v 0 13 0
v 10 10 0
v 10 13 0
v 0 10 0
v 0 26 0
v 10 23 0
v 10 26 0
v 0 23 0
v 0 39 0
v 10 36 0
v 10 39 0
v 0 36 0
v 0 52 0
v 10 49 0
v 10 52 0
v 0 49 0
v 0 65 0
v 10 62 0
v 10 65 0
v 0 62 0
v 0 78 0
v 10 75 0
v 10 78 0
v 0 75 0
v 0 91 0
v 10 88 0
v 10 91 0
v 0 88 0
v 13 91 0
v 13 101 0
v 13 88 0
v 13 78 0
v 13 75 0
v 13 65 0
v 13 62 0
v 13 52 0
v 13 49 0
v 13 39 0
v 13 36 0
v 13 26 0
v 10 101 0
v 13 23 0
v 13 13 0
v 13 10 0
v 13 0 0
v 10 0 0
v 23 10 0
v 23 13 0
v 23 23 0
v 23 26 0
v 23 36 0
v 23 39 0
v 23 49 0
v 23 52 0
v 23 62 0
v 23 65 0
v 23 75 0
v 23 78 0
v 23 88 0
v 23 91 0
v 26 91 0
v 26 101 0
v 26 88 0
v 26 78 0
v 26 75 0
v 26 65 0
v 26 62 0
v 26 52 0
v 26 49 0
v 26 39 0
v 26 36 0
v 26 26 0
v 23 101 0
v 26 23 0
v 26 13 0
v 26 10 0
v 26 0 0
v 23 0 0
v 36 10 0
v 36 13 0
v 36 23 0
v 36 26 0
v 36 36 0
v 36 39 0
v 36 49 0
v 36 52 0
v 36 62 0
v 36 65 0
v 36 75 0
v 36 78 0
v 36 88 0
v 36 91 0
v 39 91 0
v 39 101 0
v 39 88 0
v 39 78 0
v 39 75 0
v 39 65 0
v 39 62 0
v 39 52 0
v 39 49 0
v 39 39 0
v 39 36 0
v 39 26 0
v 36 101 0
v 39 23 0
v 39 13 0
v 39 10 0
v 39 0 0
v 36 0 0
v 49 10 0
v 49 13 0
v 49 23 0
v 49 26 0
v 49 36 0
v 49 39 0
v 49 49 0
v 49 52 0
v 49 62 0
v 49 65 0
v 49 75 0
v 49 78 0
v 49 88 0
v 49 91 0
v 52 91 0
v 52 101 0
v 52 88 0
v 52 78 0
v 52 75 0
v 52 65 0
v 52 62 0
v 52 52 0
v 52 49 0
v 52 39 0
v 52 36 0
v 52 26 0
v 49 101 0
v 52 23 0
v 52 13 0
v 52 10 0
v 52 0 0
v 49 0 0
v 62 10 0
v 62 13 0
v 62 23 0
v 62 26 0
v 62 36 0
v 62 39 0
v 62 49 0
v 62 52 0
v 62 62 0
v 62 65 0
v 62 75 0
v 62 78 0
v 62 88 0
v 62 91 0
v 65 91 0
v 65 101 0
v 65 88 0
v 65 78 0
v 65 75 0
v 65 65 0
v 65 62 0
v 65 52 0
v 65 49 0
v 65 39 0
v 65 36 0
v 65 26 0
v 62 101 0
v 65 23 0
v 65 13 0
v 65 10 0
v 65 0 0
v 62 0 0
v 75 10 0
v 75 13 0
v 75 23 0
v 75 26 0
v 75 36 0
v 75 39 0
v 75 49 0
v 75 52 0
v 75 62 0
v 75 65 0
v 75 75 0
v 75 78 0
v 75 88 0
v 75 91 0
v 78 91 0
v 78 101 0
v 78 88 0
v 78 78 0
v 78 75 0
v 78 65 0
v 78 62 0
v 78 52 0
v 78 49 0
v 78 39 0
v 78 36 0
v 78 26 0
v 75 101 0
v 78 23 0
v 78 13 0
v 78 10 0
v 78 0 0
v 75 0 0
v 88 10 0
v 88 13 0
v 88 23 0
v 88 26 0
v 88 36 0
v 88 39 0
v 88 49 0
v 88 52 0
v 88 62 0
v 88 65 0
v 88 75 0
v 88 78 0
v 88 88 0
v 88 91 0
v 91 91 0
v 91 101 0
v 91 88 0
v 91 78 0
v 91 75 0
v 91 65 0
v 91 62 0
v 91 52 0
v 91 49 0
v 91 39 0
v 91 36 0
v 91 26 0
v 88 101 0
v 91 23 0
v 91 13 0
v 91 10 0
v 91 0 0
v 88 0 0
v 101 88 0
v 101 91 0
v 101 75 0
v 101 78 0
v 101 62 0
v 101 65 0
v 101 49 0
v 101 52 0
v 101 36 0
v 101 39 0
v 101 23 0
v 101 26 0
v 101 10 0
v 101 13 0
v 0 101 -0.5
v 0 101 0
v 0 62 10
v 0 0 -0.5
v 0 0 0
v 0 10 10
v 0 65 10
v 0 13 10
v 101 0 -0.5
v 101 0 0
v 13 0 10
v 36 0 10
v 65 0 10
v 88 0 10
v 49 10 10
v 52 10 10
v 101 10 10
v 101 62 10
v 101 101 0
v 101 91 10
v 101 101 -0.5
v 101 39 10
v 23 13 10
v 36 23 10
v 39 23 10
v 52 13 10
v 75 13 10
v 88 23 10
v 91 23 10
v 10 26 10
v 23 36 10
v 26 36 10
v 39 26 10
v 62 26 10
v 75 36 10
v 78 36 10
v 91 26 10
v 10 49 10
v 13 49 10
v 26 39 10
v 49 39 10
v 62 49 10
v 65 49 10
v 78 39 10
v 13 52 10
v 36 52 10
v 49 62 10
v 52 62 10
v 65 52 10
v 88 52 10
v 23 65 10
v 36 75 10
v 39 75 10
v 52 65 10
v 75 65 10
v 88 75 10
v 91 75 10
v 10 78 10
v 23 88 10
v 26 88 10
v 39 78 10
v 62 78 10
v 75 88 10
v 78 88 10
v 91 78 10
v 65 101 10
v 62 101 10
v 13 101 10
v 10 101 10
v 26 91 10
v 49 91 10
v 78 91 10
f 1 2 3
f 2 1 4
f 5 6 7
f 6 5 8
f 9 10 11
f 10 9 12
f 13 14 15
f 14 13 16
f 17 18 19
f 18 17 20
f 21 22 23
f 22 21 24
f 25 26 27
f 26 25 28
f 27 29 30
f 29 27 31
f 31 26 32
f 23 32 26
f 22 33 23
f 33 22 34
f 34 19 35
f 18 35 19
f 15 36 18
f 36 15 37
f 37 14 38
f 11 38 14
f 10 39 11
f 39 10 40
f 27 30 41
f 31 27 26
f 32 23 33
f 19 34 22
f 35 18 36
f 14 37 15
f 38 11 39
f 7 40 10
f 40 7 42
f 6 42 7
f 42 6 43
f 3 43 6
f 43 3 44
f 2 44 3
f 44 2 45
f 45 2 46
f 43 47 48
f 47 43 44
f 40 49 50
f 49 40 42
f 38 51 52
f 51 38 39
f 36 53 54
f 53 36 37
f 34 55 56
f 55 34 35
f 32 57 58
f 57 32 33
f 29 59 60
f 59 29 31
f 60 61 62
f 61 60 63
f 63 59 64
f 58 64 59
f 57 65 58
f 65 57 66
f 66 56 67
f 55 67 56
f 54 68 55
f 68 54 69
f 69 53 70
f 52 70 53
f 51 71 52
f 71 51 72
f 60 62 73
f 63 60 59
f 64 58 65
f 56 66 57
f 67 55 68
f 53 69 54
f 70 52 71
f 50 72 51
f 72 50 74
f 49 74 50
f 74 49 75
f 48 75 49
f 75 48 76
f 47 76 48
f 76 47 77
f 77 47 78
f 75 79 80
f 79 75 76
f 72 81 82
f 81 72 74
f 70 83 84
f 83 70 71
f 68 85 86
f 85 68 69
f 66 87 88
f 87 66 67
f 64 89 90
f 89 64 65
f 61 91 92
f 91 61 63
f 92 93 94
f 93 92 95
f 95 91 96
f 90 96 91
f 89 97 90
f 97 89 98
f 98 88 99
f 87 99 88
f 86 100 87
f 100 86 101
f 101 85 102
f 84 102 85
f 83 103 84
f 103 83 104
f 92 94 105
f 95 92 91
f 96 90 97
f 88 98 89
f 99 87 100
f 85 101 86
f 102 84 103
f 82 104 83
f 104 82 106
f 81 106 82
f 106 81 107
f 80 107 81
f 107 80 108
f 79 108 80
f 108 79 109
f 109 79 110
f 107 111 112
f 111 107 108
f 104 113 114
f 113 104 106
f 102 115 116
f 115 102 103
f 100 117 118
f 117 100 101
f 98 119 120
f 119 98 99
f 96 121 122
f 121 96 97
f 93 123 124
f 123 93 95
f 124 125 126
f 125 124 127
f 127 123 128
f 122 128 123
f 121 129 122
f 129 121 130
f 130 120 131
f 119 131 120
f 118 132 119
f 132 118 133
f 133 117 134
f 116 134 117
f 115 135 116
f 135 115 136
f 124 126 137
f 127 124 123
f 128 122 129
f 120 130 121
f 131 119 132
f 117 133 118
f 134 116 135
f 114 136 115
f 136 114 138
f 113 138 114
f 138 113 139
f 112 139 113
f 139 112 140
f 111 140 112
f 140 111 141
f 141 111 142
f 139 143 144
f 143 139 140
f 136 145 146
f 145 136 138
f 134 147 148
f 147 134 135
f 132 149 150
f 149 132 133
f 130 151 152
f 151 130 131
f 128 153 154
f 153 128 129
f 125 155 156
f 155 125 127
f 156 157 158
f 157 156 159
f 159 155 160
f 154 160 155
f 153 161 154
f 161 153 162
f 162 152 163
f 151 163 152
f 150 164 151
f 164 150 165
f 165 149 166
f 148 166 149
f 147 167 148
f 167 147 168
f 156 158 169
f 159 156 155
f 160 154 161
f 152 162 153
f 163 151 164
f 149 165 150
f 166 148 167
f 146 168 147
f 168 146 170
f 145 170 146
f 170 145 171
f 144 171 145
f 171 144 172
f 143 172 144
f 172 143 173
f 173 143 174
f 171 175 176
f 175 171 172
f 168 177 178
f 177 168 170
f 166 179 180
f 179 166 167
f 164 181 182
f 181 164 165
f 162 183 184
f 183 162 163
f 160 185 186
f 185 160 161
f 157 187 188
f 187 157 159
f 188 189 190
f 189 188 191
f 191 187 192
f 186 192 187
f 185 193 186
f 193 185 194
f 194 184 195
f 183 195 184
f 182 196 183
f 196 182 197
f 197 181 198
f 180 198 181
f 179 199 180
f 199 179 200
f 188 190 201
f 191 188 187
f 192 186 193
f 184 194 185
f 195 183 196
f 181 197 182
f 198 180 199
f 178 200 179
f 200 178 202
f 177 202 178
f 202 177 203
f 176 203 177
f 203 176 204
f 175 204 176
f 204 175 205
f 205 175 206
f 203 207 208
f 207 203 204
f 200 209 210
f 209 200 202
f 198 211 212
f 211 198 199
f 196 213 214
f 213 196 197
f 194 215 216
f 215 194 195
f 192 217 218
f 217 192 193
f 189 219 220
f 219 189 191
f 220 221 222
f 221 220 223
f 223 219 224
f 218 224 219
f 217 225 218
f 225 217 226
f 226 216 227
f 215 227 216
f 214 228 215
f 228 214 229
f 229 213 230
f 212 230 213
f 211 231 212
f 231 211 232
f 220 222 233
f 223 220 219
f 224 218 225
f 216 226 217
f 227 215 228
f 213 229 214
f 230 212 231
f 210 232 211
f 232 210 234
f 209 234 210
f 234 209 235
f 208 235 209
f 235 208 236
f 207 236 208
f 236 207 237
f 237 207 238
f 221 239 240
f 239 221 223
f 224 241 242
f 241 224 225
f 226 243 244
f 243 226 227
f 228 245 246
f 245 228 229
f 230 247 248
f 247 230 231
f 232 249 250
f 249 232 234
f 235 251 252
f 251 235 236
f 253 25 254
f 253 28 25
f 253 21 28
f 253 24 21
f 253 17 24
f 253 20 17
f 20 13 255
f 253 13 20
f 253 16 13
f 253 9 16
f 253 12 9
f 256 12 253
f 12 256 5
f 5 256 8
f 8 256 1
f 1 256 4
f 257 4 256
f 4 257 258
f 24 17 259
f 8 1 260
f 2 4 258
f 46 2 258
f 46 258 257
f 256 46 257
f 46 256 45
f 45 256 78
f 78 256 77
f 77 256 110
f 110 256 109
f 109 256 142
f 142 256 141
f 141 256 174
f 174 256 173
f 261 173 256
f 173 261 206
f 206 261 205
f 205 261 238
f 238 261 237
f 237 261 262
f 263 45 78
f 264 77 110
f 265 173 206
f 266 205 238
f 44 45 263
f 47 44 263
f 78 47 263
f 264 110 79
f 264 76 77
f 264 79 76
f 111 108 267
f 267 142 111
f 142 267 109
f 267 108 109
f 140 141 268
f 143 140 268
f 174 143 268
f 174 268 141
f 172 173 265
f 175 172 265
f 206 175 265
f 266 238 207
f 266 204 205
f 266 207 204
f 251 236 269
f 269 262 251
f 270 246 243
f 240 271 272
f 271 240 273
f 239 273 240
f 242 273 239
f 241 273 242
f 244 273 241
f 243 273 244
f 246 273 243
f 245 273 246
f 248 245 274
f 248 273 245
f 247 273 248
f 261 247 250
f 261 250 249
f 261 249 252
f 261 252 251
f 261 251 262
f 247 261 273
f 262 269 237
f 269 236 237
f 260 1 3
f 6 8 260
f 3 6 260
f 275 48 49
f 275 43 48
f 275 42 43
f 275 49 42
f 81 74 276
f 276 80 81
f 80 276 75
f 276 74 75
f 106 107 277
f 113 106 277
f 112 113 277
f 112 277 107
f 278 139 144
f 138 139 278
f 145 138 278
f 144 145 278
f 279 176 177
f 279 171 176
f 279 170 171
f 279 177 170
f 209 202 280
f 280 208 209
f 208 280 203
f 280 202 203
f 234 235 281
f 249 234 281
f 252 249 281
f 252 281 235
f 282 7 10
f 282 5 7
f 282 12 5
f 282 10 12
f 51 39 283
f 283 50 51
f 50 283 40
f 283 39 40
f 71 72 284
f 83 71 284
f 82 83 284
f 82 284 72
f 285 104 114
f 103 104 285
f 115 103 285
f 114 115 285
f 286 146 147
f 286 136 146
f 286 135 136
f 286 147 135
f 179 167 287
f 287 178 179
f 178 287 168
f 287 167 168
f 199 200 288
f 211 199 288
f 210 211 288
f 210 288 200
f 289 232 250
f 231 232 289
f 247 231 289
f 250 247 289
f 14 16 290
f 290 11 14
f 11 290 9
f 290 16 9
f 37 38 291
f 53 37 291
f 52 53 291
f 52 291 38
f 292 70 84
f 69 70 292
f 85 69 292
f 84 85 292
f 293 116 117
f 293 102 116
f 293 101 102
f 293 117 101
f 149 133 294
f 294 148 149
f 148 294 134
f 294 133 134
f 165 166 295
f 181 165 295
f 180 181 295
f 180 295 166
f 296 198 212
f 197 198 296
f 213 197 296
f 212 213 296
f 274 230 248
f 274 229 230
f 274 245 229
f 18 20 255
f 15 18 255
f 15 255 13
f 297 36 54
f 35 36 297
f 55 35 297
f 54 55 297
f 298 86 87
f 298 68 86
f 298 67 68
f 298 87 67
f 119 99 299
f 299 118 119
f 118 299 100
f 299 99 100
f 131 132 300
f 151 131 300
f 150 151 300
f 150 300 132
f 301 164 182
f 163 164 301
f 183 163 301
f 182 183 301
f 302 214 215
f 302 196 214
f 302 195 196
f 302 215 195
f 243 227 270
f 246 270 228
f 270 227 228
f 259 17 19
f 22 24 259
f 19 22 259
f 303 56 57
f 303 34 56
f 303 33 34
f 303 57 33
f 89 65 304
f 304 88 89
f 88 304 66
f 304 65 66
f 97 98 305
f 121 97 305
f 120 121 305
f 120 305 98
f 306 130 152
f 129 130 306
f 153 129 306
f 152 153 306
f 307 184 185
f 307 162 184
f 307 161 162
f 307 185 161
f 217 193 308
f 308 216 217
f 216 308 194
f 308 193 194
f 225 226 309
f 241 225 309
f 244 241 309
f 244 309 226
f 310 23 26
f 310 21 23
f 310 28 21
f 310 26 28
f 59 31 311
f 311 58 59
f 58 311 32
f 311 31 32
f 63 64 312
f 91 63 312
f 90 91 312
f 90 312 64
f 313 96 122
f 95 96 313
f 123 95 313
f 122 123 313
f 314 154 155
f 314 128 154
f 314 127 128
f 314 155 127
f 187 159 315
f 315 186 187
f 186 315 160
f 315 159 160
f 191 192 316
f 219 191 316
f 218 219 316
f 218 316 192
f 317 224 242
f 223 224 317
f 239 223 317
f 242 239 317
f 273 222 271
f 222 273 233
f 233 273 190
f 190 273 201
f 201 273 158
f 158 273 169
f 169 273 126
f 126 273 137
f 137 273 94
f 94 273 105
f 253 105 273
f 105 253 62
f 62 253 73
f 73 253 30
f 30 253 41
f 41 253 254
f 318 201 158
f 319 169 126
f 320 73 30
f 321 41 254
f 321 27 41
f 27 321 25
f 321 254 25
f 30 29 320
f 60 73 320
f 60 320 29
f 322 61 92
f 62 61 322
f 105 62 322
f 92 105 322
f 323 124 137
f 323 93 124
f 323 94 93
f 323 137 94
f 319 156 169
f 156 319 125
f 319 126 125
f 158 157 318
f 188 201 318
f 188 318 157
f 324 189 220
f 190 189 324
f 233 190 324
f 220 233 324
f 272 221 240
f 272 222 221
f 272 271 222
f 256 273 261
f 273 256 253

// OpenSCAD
gap=3;

translate([0,0,-0.5]) cube(size = [101,101,0.5]);

for(s = [0 : 7]){ 
    row(s*(10+gap),s);
}

module form(){
 difference() {
    cube(size = [10,10,10]);
    translate([0,0,10])  rotate([0,45,0]) cube(size = [20,20,20]);
    translate([0,0,0])  rotate([45,0,0]) cube(size = [20,20,20]);
 }
}

module row(yOffset, rOffset){
  for(iX = [0 : 1]){
      for(r = [0 : 3]){ 
          
          tempR=(r+rOffset)%4;
          
          xB=(iX*4+r)*(10+gap);
          yB=yOffset;
          
          x = (tempR==1)||(tempR==2) ? xB+10 : xB;
          y = (tempR==2)||(tempR==3) ? yB+10 : yB;

  
         translate([x,y,0]) rotate([0,0,tempR*90])  form();
      }
  }
}

  
